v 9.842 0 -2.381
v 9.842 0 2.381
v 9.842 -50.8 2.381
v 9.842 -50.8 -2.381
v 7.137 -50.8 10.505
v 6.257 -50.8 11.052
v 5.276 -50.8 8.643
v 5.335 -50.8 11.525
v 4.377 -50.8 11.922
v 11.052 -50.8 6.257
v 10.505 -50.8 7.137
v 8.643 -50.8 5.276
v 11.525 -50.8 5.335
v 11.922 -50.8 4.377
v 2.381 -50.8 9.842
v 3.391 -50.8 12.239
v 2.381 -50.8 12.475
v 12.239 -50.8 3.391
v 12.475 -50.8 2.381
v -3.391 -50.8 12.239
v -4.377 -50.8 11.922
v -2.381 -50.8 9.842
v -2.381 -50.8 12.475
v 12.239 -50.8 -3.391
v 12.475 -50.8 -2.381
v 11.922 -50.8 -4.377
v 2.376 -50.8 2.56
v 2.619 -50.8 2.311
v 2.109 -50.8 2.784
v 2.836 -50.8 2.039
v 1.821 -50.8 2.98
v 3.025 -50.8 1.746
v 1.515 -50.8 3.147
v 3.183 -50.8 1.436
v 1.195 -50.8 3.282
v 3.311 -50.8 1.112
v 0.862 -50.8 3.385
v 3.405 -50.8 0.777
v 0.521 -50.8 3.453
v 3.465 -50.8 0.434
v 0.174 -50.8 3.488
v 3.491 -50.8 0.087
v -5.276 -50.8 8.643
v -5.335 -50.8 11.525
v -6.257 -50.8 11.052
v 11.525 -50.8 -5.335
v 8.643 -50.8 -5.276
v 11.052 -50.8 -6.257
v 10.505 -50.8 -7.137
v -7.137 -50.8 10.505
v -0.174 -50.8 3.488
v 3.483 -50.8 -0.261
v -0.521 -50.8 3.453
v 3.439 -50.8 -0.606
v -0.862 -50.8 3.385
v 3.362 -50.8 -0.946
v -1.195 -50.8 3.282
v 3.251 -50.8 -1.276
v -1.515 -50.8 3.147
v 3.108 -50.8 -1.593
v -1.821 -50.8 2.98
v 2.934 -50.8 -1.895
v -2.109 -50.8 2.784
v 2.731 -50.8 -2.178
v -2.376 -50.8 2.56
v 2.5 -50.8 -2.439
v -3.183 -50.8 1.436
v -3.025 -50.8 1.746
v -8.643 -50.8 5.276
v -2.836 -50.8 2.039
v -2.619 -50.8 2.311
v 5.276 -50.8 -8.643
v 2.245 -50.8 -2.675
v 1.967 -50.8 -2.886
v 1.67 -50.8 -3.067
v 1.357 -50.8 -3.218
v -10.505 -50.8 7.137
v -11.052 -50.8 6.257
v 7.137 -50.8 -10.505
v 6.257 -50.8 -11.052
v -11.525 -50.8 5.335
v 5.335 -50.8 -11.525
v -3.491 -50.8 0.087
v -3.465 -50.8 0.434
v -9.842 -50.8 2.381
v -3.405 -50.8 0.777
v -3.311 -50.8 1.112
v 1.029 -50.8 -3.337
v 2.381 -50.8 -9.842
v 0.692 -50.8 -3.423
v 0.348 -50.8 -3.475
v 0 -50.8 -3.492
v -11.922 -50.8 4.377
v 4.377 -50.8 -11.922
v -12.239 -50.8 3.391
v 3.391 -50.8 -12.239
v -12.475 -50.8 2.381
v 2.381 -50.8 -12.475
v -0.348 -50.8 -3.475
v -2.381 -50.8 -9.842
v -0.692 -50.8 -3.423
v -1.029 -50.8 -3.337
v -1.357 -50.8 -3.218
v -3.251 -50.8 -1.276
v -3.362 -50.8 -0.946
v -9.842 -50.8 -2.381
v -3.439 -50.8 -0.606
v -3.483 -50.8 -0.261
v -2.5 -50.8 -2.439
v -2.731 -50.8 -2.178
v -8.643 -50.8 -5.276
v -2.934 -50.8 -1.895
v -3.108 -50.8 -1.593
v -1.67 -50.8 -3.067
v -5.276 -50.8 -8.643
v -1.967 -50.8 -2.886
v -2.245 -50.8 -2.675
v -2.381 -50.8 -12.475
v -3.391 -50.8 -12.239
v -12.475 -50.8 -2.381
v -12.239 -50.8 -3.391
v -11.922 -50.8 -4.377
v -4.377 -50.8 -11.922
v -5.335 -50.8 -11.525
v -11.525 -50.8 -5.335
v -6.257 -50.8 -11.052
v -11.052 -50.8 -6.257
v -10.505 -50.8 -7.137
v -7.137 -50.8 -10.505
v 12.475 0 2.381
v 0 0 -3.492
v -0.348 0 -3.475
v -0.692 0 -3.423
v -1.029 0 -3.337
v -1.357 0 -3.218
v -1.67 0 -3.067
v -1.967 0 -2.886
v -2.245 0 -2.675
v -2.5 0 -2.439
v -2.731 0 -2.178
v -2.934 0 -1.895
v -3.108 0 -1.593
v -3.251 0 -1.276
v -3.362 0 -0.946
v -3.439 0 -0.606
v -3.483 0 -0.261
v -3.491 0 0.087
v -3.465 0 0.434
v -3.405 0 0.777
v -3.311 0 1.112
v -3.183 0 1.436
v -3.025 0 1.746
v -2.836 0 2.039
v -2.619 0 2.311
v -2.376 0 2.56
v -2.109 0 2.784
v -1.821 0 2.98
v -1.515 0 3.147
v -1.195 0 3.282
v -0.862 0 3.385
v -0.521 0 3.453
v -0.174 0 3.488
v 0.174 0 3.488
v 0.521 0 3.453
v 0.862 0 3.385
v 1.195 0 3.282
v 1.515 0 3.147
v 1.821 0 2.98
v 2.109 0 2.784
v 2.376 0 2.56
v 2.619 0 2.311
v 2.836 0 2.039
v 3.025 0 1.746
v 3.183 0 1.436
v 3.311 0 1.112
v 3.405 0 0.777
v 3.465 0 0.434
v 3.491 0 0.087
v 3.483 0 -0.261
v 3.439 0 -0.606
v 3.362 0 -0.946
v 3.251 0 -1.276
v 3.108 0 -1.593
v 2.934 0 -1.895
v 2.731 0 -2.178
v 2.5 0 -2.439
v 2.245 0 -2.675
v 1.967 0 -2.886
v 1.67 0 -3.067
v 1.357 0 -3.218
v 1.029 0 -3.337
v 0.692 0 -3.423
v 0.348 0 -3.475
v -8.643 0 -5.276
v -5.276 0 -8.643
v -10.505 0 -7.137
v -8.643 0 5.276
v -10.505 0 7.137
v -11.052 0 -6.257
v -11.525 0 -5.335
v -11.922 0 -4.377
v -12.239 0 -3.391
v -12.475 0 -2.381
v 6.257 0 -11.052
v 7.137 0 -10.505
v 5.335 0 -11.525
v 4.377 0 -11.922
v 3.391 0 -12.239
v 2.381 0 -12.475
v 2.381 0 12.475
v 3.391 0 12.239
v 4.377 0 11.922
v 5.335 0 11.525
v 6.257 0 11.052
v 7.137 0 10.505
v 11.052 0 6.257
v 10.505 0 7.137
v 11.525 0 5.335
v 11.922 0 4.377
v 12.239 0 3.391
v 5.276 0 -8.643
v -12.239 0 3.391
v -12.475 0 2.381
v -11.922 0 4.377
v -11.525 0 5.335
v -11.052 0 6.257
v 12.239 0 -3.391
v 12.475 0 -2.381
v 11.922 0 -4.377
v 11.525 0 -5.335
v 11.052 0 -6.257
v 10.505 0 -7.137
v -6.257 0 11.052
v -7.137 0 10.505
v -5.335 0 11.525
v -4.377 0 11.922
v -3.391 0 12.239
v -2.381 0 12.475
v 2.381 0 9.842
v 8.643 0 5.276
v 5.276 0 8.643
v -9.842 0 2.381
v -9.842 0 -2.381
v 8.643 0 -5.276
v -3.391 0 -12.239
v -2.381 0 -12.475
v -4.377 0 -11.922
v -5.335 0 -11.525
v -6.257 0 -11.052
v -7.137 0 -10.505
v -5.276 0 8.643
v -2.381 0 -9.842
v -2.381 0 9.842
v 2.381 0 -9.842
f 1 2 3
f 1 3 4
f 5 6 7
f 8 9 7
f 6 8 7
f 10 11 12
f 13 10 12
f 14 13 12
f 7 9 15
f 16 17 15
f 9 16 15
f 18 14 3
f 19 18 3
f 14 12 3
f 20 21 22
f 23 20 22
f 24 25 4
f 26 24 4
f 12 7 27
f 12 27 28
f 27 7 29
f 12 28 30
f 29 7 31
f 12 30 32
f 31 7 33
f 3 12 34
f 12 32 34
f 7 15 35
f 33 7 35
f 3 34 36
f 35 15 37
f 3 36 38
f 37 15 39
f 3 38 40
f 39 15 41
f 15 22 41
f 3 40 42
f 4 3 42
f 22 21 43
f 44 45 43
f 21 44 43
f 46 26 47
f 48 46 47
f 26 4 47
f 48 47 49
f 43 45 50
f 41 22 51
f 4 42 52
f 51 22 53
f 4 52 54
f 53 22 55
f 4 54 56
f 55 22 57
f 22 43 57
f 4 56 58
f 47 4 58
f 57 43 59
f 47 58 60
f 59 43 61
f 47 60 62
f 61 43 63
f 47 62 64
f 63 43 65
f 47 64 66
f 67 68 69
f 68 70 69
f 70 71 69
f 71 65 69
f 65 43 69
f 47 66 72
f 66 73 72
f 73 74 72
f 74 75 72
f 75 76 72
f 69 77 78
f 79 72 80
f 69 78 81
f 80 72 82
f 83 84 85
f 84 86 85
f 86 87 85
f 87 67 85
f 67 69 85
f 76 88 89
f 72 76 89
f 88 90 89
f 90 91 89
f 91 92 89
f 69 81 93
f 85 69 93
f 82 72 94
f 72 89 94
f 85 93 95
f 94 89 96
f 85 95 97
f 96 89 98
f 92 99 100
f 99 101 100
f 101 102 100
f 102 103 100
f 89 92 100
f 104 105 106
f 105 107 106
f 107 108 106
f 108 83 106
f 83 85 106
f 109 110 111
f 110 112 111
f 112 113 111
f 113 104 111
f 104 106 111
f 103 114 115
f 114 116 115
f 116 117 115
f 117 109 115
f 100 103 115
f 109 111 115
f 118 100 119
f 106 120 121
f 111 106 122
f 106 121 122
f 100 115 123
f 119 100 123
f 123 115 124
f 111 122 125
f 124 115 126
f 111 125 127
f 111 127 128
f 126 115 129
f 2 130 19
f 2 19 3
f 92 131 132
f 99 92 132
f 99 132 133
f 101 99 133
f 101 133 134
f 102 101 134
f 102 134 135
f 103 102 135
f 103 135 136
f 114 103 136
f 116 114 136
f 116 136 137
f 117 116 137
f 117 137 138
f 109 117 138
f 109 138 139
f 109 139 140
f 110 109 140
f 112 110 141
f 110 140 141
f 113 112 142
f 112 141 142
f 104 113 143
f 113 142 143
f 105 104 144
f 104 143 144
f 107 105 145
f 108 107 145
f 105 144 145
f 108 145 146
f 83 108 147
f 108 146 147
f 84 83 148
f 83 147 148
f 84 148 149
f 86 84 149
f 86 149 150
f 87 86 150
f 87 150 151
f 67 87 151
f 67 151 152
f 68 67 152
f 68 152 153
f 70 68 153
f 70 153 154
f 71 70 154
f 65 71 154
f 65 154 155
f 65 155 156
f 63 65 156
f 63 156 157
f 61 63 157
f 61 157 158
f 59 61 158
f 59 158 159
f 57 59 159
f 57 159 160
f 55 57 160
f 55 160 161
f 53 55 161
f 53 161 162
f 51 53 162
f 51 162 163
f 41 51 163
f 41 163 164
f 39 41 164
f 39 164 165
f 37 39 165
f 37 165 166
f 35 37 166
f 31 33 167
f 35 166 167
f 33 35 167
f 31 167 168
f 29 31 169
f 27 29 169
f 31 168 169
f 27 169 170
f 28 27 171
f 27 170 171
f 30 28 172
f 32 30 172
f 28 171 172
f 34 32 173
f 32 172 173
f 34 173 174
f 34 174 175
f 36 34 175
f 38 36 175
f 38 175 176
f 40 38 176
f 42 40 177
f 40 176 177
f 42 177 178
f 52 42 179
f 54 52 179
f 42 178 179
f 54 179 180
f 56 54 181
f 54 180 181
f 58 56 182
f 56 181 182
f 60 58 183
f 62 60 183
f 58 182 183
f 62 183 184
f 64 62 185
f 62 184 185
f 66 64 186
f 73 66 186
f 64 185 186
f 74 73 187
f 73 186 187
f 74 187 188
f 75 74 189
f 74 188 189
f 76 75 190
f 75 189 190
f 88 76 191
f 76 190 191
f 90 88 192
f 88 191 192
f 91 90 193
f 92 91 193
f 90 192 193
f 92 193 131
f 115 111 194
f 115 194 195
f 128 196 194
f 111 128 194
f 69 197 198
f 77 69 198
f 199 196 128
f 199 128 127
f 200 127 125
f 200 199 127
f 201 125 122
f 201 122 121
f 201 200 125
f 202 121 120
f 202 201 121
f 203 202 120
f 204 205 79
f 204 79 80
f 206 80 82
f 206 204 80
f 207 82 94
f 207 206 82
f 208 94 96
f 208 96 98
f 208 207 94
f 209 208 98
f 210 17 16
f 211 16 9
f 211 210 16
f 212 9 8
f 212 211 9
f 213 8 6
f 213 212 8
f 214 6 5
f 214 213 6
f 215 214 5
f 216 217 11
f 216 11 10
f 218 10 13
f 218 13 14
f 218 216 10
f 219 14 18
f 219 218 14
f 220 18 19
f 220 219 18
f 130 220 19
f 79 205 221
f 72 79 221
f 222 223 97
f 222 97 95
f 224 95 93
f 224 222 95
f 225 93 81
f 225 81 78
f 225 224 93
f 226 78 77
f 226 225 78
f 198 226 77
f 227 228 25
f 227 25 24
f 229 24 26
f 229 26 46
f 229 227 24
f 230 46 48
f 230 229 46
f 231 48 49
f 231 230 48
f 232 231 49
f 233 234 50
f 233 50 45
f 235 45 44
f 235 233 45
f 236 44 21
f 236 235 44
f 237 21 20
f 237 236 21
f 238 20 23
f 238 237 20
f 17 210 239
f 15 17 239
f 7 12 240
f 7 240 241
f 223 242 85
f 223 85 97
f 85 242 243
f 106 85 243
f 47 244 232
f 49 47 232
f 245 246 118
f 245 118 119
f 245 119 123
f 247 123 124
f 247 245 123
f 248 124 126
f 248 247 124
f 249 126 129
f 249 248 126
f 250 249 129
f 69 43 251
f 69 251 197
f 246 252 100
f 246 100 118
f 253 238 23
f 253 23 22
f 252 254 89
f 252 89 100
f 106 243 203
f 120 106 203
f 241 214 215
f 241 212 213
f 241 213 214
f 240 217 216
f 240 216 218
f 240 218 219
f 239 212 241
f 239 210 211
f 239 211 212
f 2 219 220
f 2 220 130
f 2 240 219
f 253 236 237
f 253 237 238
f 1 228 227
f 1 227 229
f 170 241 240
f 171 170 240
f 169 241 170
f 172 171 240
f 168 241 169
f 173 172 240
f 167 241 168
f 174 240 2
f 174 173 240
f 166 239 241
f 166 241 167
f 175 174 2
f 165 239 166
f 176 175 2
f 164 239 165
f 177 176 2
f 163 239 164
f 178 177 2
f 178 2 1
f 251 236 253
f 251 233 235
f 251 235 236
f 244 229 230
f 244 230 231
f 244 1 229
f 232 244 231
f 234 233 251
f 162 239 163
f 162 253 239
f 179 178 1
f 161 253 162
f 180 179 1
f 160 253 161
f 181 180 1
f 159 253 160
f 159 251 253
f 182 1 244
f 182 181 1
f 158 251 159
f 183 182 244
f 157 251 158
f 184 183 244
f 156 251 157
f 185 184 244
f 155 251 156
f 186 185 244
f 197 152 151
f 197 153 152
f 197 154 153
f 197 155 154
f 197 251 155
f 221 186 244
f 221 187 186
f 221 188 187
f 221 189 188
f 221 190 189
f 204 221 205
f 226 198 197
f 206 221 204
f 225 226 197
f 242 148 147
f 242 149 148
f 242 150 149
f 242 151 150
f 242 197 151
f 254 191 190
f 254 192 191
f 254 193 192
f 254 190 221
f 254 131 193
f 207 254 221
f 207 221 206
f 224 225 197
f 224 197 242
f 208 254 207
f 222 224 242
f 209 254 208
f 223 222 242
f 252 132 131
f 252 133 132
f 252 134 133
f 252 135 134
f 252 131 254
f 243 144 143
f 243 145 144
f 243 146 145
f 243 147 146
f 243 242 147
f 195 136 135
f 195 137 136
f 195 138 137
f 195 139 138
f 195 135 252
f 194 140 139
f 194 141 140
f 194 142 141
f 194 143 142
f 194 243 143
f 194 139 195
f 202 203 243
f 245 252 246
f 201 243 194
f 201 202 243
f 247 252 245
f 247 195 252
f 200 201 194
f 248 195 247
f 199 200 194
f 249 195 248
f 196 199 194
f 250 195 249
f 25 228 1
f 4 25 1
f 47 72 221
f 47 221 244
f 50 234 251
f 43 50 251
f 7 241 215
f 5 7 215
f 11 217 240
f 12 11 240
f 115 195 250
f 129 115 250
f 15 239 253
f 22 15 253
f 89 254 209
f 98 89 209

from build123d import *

# Parameters (mm, degrees)
SKETCH1_R           = 12.7
BOSS_EXTRUDE1_DEPTH = 50.8
SKETCH2_R           = 3.4925
SKETCH2_W           = 4.7625
SKETCH2_H           = 5.715
SKETCH2_W_2         = 5.715
SKETCH2_H_2         = 4.7625
CUT_EXTRUDE1_DEPTH  = 109.22


with BuildPart() as part:
    # Sketch1 → Boss-Extrude1 (new body)
    with BuildSketch(Plane(origin=(0, 0, 0), x_dir=(0, 0, -1), z_dir=(0, 1, 0))):
        Circle(SKETCH1_R)
    extrude(amount=-BOSS_EXTRUDE1_DEPTH)

    # Sketch2 → Cut-Extrude1 (cut)
    with BuildSketch(Plane(origin=(0, 0, 0), x_dir=(0, 0, -1), z_dir=(0, 1, 0))):
        Circle(SKETCH2_R)
        Polygon((12.684611771, 9.317015726), (9.317015726, 12.684611771), (5.275900471, 8.643496517), (8.643496517, 5.275900471), align=None)
        with Locations((0, 12.7)):
            Rectangle(SKETCH2_W, SKETCH2_H)
        with Locations((12.7, 0)):
            Rectangle(SKETCH2_W_2, SKETCH2_H_2)
        Polygon((9.317015726, -12.684611771), (12.684611771, -9.317015726), (8.643496517, -5.275900471), (5.275900471, -8.643496517), align=None)
        with Locations((0, -12.7)):
            Rectangle(SKETCH2_W, SKETCH2_H)
        Polygon((-12.684611771, -9.317015726), (-9.317015726, -12.684611771), (-5.275900471, -8.643496517), (-8.643496517, -5.275900471), align=None)
        with Locations((-12.7, 0)):
            Rectangle(SKETCH2_W_2, SKETCH2_H_2)
        Polygon((-9.317015726, 12.684611771), (-12.684611771, 9.317015726), (-8.643496517, 5.275900471), (-5.275900471, 8.643496517), align=None)
    extrude(amount=-CUT_EXTRUDE1_DEPTH, mode=Mode.SUBTRACT)


solid = part.part
